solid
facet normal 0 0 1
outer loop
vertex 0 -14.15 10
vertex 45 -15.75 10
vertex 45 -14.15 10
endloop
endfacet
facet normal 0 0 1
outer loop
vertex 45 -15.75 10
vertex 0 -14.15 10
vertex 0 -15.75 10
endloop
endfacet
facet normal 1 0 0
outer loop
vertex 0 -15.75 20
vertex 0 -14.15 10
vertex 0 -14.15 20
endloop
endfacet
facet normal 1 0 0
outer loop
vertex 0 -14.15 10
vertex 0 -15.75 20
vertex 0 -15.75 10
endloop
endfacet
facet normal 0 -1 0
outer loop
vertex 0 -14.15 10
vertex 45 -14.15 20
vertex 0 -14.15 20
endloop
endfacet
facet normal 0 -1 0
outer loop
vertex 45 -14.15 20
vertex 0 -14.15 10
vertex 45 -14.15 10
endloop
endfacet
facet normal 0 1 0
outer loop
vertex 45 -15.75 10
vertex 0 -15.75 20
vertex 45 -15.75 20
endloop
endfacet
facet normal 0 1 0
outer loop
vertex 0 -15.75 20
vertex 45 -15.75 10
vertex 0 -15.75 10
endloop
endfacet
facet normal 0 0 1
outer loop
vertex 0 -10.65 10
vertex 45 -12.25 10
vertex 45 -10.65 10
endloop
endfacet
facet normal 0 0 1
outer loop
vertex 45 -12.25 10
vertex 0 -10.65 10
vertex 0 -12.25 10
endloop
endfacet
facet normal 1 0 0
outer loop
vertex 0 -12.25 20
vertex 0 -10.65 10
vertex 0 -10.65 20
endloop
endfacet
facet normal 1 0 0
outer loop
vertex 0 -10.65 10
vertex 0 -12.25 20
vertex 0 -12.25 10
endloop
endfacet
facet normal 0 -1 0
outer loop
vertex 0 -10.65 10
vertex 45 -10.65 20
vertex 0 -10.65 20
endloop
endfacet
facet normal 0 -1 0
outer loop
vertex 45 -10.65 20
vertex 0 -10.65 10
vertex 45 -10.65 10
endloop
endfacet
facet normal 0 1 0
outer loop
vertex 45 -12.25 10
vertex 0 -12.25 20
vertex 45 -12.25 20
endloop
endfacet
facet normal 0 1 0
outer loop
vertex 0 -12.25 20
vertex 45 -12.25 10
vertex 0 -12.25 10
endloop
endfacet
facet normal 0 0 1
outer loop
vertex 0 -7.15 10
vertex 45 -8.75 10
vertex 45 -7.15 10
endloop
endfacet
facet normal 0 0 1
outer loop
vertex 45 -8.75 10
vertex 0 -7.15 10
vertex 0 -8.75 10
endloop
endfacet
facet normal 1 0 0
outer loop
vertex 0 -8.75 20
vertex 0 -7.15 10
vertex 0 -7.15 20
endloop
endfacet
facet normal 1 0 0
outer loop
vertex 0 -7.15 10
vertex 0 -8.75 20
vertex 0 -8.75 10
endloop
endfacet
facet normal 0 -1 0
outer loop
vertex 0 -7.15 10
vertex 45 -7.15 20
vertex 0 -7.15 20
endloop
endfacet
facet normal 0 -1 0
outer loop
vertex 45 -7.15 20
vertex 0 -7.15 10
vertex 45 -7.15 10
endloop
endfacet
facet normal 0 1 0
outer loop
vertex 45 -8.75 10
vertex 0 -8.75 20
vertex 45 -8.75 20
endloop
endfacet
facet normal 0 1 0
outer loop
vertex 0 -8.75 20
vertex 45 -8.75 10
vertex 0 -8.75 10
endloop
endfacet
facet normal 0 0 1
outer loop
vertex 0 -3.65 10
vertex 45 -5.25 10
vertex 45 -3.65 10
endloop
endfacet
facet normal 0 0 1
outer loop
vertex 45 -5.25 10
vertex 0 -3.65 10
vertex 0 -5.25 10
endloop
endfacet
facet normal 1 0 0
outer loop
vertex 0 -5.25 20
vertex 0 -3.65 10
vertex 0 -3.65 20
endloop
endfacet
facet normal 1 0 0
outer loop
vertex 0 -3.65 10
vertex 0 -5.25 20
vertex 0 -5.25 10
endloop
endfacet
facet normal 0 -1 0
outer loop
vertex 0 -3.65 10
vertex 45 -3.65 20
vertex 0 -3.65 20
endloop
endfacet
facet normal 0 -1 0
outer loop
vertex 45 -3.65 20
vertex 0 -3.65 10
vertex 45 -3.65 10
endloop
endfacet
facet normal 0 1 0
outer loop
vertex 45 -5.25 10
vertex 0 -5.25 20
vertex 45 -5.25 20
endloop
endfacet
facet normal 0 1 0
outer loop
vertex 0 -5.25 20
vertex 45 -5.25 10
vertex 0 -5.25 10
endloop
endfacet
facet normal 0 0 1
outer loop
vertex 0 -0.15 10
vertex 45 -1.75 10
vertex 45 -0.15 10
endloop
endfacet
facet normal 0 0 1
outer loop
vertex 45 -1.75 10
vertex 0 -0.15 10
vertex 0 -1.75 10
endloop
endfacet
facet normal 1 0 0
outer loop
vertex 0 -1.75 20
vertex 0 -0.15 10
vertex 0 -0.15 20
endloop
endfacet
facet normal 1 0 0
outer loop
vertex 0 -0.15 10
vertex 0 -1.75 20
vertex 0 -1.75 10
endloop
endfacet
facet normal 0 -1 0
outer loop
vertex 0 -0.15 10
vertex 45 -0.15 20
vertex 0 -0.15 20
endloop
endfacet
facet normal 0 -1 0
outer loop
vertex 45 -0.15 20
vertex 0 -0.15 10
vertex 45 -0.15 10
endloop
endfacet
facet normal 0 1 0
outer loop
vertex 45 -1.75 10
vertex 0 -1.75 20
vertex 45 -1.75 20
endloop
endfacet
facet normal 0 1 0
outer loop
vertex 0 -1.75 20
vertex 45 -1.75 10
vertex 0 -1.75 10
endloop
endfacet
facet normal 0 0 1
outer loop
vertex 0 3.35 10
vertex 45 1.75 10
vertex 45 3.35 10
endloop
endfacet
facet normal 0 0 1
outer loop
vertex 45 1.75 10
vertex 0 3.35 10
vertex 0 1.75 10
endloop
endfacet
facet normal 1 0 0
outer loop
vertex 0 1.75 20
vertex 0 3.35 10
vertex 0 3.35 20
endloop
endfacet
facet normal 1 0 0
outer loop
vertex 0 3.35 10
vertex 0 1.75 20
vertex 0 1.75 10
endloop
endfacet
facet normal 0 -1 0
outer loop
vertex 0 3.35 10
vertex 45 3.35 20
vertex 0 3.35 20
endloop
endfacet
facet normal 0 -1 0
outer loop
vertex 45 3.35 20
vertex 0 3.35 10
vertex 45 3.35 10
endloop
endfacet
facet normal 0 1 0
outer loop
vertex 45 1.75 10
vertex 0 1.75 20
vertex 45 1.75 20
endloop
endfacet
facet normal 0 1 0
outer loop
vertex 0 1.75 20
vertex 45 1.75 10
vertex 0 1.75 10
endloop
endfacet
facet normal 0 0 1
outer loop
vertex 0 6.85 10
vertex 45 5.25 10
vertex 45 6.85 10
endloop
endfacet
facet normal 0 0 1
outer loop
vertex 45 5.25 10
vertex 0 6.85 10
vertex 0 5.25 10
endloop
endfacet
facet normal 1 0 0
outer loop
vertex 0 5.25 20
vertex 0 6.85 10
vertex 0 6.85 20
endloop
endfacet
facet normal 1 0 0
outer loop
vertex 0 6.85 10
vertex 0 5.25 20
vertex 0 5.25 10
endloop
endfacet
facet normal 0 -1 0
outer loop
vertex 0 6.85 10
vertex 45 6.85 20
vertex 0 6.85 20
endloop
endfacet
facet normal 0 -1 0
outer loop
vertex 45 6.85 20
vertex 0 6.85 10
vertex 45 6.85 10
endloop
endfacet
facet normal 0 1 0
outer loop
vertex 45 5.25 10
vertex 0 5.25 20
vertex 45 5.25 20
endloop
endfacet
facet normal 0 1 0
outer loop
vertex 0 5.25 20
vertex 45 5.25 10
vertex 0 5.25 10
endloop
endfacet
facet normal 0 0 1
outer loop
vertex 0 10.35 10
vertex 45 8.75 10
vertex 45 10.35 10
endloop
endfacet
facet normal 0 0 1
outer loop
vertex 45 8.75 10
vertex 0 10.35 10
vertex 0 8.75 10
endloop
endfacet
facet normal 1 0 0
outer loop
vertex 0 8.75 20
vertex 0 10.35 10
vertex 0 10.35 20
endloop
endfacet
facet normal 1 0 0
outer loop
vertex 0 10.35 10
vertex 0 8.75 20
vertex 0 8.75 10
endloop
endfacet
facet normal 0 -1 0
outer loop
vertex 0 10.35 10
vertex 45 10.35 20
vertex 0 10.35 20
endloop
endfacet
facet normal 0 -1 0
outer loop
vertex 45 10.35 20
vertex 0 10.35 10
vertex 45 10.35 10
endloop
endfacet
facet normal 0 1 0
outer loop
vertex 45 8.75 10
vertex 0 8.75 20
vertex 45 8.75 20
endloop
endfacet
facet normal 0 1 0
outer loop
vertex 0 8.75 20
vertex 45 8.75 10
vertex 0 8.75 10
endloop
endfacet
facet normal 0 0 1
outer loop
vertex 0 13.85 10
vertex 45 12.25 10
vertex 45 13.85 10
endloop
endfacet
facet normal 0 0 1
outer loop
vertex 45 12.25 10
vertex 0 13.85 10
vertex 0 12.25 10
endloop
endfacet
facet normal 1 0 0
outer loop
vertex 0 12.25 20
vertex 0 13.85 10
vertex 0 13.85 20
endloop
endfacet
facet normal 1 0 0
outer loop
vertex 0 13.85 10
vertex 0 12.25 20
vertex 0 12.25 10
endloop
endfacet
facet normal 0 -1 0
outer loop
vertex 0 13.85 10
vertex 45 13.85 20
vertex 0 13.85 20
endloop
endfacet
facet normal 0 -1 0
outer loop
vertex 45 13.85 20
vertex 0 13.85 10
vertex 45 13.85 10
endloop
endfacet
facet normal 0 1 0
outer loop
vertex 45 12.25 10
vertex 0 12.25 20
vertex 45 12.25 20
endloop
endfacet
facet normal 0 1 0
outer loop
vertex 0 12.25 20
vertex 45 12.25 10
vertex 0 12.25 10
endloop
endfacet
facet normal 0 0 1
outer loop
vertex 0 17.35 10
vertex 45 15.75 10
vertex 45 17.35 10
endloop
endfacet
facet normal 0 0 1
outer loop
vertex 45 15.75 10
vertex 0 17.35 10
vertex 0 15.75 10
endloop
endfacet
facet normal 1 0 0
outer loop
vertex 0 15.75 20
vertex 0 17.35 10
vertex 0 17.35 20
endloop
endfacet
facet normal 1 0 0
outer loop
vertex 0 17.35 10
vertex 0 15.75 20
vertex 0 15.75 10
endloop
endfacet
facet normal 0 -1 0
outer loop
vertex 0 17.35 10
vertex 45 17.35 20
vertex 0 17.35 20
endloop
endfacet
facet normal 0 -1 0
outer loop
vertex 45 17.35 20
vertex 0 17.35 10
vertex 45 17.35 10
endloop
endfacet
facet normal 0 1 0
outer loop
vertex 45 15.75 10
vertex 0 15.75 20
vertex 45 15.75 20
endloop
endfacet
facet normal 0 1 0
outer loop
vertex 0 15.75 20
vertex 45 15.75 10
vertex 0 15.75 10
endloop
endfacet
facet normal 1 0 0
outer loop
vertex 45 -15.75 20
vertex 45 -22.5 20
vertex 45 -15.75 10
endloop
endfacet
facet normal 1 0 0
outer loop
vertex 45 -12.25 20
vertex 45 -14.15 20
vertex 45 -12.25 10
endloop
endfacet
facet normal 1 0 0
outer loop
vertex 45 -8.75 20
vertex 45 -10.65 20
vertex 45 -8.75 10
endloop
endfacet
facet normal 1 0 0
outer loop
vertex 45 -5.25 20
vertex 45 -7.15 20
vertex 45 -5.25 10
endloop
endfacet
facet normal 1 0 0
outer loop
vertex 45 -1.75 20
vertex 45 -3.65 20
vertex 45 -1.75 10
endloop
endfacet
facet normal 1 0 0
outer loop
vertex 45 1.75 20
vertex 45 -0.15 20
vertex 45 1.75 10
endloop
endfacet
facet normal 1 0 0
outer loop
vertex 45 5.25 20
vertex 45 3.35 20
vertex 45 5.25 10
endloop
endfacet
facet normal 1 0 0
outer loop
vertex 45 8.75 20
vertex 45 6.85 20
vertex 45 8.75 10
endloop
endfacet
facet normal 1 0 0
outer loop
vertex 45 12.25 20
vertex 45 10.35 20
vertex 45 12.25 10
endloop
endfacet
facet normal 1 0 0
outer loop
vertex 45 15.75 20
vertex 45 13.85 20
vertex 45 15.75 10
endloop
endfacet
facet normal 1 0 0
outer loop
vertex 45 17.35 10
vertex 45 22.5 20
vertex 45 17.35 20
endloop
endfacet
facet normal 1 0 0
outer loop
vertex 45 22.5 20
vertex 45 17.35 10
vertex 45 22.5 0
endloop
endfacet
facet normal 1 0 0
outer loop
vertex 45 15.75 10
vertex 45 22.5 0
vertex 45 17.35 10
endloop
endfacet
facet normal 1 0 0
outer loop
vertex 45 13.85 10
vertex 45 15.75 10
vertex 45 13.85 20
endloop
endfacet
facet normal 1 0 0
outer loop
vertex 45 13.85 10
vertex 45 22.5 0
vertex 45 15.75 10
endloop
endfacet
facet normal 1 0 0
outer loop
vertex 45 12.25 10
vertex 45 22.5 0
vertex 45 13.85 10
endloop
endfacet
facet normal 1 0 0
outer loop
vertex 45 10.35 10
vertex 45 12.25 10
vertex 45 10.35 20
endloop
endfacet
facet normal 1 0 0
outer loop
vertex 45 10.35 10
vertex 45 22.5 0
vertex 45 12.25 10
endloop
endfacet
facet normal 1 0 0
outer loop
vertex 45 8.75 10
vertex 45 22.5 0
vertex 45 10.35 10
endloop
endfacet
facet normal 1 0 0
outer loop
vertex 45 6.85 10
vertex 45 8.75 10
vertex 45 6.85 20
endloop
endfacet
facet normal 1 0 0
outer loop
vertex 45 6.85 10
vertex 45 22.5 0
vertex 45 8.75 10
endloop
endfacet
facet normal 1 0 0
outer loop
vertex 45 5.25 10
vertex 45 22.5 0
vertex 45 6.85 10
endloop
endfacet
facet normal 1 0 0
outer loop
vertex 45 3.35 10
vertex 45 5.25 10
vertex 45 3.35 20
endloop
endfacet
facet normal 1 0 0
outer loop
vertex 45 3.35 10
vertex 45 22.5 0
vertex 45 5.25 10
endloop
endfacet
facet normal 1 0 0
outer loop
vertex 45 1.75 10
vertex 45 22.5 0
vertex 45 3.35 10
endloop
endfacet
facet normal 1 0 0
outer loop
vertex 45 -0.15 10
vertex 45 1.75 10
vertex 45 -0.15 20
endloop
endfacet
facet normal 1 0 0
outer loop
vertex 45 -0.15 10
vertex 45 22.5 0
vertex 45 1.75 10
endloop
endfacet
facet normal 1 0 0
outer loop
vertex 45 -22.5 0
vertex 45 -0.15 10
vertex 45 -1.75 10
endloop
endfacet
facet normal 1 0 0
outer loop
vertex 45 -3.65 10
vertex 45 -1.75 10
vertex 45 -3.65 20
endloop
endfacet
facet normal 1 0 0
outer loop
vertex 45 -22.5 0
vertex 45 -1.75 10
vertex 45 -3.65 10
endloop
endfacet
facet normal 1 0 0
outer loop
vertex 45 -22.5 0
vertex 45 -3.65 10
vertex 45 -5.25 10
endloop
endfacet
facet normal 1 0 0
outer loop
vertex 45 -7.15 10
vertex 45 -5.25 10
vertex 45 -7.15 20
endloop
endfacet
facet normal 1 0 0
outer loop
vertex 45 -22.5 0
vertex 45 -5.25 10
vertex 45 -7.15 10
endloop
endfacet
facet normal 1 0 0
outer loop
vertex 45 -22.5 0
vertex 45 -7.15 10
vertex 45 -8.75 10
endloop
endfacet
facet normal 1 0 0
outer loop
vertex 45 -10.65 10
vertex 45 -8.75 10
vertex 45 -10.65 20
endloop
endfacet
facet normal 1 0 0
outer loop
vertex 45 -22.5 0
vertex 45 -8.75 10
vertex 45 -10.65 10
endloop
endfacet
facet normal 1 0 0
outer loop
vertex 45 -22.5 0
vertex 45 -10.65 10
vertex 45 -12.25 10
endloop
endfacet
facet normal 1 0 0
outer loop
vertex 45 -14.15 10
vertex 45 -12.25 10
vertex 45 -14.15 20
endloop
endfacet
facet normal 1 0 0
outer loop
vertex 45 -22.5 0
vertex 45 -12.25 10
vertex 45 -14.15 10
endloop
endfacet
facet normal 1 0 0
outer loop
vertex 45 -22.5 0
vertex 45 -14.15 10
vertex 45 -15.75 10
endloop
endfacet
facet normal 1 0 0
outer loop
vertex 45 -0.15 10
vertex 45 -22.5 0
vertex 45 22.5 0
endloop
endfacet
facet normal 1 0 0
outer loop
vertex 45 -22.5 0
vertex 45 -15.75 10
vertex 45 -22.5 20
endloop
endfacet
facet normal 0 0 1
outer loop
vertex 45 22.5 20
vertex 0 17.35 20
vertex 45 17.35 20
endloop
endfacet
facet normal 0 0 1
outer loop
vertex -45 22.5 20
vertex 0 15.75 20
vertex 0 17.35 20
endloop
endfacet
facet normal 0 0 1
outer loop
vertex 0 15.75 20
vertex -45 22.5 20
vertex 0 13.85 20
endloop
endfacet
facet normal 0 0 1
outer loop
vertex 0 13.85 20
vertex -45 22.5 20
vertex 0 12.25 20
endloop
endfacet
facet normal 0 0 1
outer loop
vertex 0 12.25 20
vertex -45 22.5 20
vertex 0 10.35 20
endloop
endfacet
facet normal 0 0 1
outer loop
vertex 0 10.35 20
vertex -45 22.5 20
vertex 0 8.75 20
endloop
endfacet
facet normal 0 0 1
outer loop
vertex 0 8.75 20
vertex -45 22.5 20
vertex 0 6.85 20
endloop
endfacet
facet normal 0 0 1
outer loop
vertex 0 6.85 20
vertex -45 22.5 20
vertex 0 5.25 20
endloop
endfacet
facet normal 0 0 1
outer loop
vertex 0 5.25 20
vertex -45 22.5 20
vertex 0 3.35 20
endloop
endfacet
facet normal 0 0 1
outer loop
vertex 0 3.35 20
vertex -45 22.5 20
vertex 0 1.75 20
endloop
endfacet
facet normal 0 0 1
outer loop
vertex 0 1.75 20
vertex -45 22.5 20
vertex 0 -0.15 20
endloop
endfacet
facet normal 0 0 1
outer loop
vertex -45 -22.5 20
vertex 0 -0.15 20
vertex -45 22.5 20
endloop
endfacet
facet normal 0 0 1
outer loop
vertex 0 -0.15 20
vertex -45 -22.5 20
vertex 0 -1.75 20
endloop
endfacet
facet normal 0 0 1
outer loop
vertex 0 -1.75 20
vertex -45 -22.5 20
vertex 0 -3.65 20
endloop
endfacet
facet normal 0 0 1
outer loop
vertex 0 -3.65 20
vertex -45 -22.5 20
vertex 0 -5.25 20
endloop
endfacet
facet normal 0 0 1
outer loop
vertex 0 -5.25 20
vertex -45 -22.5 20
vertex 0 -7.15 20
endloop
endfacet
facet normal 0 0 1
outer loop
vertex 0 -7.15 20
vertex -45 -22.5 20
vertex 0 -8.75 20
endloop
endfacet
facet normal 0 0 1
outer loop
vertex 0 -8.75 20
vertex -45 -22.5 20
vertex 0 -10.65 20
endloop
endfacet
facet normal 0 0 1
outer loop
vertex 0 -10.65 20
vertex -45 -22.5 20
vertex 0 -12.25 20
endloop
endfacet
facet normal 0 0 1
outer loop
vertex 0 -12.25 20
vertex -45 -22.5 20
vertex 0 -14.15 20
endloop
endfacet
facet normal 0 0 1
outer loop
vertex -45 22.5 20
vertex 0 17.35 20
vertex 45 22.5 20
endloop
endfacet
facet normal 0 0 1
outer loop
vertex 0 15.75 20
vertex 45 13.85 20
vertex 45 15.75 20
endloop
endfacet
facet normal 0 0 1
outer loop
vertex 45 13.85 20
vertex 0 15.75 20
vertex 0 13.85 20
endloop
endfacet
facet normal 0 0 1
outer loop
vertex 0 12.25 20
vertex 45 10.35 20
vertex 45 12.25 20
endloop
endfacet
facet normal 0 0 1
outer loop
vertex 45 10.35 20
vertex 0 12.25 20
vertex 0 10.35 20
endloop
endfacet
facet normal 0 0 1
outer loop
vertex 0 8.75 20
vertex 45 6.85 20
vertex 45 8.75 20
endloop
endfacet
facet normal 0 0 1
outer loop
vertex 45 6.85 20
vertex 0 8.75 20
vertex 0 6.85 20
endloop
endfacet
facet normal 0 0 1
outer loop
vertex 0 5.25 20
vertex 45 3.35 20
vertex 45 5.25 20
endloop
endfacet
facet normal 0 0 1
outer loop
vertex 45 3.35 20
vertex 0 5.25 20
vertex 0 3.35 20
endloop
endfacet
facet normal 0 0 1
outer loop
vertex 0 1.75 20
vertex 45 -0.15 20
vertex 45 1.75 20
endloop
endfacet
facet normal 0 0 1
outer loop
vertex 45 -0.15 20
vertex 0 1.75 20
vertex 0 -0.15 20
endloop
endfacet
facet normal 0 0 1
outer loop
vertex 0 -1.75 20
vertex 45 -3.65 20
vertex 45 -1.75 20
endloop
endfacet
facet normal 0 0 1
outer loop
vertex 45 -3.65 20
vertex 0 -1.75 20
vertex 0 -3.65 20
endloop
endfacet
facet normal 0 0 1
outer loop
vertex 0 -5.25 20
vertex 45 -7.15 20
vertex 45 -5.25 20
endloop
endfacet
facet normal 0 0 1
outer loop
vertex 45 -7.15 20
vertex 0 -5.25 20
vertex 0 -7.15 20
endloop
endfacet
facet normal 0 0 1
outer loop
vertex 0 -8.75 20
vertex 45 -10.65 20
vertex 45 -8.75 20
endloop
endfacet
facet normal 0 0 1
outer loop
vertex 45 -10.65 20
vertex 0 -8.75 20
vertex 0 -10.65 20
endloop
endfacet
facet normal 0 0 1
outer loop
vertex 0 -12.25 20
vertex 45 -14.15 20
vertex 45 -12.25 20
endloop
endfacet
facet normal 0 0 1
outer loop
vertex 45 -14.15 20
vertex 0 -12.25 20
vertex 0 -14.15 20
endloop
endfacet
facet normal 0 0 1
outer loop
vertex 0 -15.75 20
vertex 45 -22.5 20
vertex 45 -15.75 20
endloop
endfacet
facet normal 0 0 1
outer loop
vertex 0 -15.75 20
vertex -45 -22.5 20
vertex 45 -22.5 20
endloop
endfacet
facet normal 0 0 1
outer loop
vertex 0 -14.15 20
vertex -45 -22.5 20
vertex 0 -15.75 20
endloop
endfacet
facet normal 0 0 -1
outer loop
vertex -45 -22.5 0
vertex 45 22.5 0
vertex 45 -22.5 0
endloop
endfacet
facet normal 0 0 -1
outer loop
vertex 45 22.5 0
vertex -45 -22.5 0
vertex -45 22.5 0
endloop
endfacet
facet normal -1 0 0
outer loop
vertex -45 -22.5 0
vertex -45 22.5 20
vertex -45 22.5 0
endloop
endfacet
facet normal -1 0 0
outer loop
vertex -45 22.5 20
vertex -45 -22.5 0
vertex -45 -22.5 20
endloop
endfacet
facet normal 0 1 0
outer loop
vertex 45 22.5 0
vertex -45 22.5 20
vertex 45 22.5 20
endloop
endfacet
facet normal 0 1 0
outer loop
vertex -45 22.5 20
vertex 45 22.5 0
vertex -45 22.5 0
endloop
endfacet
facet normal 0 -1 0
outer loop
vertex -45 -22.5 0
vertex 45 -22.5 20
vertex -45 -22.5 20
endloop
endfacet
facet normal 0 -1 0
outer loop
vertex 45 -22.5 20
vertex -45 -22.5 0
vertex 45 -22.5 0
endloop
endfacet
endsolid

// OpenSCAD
// Microscope slide drying rack
// Print orientation: base on XY plane, slots open upward (+Z)

$fn = 64;

// ---- Block dimensions ----
block_len   = 90;   // X length (mm)
block_wid   = 45;   // Y width (mm)
block_h     = 20;   // Z height (mm)

// ---- Slot dimensions ----
slot_count  = 10;   // number of slide slots
slot_len    = 77;   // slot length along X (mm)
slot_w      = 1.6;  // slot width along Y (mm)
slot_d      = 10;   // slot depth from top face (mm)
slot_pitch  = 3.5;  // centre-to-centre spacing along Y (mm)

// ---- Cutting overlap ----
eps         = 0.5;  // extension past cut faces (mm)

difference() {
    // Base block
    translate([-block_len/2, -block_wid/2, 0])
        cube([block_len, block_wid, block_h]);

    // Slot group, centred in X and Y
    for (i = [0 : slot_count - 1]) {
        y = (i - (slot_count - 1)/2) * slot_pitch;
        translate([0, y, block_h - slot_d])
            cube([slot_len, slot_w, slot_d + eps]);
    }
}
